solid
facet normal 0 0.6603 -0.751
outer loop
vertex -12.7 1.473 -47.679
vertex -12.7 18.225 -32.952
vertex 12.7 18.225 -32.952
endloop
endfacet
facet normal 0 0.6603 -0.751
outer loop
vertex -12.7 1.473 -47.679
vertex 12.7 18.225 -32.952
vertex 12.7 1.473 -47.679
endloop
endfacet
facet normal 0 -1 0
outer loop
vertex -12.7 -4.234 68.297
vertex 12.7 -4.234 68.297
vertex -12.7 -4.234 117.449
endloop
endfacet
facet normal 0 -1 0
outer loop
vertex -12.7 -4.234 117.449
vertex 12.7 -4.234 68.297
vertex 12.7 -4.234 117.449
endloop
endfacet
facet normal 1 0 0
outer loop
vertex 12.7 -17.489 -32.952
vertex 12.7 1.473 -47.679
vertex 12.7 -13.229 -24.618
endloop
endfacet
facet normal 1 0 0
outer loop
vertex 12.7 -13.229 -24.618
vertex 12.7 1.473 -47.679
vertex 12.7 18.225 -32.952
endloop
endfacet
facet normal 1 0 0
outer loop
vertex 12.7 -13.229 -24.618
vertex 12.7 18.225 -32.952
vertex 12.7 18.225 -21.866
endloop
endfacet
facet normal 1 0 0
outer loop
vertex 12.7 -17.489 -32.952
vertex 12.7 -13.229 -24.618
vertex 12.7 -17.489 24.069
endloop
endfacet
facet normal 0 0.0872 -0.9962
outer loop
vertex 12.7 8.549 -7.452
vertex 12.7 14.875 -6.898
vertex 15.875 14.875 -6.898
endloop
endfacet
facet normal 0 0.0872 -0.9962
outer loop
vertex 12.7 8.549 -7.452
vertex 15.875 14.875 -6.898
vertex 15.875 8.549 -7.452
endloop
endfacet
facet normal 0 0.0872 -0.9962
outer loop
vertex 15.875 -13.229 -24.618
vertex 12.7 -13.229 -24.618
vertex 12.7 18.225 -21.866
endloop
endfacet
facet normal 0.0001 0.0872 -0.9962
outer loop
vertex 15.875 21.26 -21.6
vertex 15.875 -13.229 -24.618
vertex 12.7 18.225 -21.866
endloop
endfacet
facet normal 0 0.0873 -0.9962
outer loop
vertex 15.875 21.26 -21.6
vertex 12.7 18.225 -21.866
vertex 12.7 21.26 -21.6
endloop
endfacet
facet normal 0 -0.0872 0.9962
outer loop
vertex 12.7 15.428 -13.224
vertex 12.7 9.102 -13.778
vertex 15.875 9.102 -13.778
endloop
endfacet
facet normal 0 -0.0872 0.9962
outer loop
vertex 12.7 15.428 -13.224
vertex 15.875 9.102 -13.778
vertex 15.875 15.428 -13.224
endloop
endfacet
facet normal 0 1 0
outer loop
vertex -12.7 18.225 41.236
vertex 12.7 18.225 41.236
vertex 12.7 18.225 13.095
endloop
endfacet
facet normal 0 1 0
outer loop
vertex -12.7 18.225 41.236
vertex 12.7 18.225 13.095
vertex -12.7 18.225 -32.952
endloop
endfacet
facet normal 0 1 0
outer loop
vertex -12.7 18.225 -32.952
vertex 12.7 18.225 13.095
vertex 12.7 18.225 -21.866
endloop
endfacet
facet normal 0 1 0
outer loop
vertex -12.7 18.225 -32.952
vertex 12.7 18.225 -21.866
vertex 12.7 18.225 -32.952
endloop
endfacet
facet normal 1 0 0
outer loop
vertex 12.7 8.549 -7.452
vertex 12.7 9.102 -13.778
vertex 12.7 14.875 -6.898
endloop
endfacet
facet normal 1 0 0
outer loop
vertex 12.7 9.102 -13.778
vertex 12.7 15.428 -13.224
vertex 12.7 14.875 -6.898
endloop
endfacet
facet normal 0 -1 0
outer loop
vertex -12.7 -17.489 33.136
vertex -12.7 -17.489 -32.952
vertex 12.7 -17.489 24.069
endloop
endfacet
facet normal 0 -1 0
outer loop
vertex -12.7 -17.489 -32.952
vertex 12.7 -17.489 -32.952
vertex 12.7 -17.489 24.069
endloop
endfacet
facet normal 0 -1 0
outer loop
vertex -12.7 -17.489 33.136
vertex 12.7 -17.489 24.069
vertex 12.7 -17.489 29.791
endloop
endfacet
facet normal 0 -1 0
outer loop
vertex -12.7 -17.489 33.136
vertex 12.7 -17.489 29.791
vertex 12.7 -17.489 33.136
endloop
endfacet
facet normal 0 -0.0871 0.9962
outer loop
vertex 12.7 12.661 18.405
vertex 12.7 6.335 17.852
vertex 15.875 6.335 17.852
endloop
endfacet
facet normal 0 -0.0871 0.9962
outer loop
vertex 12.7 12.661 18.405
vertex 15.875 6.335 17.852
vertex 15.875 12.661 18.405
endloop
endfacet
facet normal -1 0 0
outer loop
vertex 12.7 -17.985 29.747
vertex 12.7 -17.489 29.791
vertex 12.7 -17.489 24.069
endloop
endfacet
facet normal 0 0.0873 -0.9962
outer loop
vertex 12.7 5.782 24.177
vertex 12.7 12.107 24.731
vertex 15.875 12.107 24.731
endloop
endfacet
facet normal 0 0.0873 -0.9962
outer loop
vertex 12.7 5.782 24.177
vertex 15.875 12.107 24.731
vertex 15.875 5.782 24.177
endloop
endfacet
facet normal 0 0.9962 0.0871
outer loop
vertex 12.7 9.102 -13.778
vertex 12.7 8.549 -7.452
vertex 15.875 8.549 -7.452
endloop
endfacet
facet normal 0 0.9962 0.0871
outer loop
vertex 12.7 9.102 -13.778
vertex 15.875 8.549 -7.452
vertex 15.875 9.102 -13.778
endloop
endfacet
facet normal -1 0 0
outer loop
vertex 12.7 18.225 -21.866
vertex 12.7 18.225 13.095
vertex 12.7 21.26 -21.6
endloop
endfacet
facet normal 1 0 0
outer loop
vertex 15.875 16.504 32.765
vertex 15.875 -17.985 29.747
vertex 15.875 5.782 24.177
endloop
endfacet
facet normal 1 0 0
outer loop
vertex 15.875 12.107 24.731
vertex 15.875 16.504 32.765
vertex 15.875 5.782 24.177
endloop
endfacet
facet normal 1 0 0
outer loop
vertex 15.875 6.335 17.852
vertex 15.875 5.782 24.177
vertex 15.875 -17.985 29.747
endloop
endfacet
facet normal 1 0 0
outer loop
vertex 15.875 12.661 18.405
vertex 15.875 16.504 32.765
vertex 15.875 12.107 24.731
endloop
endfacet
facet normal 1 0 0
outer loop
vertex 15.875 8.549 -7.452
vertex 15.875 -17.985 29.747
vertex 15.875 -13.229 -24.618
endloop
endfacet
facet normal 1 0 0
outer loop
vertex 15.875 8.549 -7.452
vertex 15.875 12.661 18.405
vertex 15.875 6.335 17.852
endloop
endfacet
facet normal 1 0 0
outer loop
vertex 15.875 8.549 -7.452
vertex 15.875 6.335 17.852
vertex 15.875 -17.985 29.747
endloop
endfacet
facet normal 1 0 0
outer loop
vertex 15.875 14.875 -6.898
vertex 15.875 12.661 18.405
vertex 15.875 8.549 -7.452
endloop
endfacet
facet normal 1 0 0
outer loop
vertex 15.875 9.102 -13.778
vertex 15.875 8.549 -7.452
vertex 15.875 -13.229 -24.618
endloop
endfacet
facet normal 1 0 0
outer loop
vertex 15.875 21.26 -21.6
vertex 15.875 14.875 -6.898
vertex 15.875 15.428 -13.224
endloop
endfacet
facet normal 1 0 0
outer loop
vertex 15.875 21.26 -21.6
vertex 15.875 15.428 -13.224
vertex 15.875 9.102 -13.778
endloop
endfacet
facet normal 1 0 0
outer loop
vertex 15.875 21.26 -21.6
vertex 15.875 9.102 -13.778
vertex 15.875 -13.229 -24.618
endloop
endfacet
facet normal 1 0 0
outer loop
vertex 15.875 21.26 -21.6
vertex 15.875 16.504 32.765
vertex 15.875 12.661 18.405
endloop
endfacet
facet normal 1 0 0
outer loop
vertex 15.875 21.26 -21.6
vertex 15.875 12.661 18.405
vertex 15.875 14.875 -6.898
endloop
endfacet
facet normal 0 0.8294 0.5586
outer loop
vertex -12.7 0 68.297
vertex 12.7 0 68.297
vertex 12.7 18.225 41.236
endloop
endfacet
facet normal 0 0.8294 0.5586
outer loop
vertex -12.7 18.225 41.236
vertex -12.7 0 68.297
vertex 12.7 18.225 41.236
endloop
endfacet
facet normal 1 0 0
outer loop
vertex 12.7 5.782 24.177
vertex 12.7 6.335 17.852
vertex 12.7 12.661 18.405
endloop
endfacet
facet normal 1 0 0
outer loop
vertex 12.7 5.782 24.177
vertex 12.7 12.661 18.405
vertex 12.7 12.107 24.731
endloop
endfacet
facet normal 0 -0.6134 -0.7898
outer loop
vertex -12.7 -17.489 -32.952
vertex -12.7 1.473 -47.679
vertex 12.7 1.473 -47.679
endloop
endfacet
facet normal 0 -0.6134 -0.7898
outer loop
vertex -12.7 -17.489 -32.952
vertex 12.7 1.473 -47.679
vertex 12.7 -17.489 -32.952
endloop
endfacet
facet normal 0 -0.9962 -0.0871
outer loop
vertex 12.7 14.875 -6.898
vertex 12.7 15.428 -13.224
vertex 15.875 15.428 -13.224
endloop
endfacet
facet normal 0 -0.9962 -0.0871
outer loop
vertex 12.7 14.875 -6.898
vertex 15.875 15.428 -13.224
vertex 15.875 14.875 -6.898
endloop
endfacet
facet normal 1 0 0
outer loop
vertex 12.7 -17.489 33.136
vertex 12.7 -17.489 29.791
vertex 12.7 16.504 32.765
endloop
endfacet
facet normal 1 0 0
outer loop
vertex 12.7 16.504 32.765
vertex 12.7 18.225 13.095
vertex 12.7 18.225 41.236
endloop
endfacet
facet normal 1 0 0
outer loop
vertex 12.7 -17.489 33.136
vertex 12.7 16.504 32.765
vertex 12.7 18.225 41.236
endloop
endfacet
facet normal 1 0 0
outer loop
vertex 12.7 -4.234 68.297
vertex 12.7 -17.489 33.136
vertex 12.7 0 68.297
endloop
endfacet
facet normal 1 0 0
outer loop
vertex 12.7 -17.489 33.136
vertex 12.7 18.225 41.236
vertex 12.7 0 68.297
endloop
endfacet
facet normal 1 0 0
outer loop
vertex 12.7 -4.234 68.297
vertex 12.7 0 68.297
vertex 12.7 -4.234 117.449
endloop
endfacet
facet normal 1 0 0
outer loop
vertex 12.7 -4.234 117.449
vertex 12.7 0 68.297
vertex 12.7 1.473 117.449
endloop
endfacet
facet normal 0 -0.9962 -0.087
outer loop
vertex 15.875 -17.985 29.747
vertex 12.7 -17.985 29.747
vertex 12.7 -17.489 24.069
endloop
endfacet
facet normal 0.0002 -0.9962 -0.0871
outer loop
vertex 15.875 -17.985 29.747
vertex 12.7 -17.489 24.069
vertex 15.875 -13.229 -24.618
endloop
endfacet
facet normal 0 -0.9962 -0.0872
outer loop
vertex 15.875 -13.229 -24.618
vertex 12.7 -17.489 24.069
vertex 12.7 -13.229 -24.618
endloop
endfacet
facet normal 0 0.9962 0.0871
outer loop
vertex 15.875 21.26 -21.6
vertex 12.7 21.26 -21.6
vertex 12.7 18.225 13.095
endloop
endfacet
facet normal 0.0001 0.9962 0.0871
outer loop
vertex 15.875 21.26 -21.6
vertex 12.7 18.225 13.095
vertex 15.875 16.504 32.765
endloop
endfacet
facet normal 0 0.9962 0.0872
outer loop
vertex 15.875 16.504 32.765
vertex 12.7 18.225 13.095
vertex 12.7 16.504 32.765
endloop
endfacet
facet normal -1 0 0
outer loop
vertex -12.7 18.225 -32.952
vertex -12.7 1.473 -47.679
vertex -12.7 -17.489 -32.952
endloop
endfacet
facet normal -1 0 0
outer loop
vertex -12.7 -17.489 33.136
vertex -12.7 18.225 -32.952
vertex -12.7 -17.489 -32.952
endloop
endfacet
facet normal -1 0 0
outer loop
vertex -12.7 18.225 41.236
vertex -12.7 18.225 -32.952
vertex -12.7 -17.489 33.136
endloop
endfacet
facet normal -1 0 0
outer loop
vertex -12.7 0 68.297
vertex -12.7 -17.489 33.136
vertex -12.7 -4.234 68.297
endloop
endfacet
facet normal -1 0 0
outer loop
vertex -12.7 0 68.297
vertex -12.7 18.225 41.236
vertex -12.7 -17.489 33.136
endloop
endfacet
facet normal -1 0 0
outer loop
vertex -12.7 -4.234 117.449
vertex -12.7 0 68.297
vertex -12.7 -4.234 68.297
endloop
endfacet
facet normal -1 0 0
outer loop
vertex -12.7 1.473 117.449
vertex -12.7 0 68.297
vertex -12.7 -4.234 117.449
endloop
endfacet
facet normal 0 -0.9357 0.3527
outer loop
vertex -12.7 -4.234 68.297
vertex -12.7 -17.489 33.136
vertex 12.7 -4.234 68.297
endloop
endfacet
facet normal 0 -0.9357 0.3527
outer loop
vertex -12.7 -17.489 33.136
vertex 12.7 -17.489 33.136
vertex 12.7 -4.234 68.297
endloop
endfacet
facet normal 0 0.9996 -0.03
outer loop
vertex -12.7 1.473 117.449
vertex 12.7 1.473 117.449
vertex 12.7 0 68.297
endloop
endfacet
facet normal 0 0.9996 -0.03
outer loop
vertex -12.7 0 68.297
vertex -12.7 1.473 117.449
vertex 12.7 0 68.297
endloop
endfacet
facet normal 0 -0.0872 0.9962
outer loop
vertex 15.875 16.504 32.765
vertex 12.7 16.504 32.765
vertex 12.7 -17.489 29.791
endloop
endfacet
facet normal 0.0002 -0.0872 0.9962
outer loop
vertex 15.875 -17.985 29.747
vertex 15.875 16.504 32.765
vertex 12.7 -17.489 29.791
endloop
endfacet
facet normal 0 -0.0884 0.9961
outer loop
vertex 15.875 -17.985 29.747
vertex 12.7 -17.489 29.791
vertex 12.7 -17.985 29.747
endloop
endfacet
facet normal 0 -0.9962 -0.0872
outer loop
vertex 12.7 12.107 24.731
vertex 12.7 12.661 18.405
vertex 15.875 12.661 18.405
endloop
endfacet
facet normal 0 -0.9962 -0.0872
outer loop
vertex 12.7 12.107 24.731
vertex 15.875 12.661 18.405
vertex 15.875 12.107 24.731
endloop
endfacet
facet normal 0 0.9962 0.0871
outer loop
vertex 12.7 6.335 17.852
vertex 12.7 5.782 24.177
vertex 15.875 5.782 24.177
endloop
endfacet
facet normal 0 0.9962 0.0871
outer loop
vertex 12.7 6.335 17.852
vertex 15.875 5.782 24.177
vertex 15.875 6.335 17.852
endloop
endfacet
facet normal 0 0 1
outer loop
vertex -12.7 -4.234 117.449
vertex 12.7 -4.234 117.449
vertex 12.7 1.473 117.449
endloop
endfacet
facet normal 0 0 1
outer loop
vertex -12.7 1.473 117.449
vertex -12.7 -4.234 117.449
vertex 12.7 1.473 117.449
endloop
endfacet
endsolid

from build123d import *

# Parameters (mm, degrees)
BOSS_EXTRUDE1_DEPTH = 12.7
BOSS_EXTRUDE2_DEPTH = 3.175


with BuildPart() as part:
    # Sketch1 → Boss-Extrude1 (new, symmetric)
    with BuildSketch(Plane(origin=(0, 0, 0), x_dir=(0, 0, -1), z_dir=(1, 0, 0))):
        Polygon((-68.297268412, 0), (-41.236086589, 18.224877555), (32.952051336, 18.224877555), (47.679225118, 1.472717378), (32.952051336, -17.488518866), (-33.136141009, -17.488518866), (-68.297268412, -4.234062462), (-117.449210909, -4.234062462), (-117.449210909, 1.472717378), align=None)
    extrude(amount=BOSS_EXTRUDE1_DEPTH, both=True)

    # Sketch2 → Boss-Extrude2 (add)
    with BuildSketch(Plane(origin=(12.7, 0, 0), x_dir=(0, 0, -1), z_dir=(1, 0, 0))):
        Polygon((-29.747162431, -17.985294415), (24.617608562, -13.228993258), (21.600184439, 21.260322286), (-32.764586554, 16.504021128), align=None)
        Polygon((-24.177392815, 5.781642489), (-17.851556482, 6.335081455), (-18.404995449, 12.660917788), (-24.730831781, 12.107478822), align=None, mode=Mode.SUBTRACT)
        Polygon((7.451788849, 8.548837321), (13.777625182, 9.102276288), (13.224186216, 15.428112621), (6.898349883, 14.874673654), align=None, mode=Mode.SUBTRACT)
    extrude(amount=BOSS_EXTRUDE2_DEPTH)


solid = part.part
